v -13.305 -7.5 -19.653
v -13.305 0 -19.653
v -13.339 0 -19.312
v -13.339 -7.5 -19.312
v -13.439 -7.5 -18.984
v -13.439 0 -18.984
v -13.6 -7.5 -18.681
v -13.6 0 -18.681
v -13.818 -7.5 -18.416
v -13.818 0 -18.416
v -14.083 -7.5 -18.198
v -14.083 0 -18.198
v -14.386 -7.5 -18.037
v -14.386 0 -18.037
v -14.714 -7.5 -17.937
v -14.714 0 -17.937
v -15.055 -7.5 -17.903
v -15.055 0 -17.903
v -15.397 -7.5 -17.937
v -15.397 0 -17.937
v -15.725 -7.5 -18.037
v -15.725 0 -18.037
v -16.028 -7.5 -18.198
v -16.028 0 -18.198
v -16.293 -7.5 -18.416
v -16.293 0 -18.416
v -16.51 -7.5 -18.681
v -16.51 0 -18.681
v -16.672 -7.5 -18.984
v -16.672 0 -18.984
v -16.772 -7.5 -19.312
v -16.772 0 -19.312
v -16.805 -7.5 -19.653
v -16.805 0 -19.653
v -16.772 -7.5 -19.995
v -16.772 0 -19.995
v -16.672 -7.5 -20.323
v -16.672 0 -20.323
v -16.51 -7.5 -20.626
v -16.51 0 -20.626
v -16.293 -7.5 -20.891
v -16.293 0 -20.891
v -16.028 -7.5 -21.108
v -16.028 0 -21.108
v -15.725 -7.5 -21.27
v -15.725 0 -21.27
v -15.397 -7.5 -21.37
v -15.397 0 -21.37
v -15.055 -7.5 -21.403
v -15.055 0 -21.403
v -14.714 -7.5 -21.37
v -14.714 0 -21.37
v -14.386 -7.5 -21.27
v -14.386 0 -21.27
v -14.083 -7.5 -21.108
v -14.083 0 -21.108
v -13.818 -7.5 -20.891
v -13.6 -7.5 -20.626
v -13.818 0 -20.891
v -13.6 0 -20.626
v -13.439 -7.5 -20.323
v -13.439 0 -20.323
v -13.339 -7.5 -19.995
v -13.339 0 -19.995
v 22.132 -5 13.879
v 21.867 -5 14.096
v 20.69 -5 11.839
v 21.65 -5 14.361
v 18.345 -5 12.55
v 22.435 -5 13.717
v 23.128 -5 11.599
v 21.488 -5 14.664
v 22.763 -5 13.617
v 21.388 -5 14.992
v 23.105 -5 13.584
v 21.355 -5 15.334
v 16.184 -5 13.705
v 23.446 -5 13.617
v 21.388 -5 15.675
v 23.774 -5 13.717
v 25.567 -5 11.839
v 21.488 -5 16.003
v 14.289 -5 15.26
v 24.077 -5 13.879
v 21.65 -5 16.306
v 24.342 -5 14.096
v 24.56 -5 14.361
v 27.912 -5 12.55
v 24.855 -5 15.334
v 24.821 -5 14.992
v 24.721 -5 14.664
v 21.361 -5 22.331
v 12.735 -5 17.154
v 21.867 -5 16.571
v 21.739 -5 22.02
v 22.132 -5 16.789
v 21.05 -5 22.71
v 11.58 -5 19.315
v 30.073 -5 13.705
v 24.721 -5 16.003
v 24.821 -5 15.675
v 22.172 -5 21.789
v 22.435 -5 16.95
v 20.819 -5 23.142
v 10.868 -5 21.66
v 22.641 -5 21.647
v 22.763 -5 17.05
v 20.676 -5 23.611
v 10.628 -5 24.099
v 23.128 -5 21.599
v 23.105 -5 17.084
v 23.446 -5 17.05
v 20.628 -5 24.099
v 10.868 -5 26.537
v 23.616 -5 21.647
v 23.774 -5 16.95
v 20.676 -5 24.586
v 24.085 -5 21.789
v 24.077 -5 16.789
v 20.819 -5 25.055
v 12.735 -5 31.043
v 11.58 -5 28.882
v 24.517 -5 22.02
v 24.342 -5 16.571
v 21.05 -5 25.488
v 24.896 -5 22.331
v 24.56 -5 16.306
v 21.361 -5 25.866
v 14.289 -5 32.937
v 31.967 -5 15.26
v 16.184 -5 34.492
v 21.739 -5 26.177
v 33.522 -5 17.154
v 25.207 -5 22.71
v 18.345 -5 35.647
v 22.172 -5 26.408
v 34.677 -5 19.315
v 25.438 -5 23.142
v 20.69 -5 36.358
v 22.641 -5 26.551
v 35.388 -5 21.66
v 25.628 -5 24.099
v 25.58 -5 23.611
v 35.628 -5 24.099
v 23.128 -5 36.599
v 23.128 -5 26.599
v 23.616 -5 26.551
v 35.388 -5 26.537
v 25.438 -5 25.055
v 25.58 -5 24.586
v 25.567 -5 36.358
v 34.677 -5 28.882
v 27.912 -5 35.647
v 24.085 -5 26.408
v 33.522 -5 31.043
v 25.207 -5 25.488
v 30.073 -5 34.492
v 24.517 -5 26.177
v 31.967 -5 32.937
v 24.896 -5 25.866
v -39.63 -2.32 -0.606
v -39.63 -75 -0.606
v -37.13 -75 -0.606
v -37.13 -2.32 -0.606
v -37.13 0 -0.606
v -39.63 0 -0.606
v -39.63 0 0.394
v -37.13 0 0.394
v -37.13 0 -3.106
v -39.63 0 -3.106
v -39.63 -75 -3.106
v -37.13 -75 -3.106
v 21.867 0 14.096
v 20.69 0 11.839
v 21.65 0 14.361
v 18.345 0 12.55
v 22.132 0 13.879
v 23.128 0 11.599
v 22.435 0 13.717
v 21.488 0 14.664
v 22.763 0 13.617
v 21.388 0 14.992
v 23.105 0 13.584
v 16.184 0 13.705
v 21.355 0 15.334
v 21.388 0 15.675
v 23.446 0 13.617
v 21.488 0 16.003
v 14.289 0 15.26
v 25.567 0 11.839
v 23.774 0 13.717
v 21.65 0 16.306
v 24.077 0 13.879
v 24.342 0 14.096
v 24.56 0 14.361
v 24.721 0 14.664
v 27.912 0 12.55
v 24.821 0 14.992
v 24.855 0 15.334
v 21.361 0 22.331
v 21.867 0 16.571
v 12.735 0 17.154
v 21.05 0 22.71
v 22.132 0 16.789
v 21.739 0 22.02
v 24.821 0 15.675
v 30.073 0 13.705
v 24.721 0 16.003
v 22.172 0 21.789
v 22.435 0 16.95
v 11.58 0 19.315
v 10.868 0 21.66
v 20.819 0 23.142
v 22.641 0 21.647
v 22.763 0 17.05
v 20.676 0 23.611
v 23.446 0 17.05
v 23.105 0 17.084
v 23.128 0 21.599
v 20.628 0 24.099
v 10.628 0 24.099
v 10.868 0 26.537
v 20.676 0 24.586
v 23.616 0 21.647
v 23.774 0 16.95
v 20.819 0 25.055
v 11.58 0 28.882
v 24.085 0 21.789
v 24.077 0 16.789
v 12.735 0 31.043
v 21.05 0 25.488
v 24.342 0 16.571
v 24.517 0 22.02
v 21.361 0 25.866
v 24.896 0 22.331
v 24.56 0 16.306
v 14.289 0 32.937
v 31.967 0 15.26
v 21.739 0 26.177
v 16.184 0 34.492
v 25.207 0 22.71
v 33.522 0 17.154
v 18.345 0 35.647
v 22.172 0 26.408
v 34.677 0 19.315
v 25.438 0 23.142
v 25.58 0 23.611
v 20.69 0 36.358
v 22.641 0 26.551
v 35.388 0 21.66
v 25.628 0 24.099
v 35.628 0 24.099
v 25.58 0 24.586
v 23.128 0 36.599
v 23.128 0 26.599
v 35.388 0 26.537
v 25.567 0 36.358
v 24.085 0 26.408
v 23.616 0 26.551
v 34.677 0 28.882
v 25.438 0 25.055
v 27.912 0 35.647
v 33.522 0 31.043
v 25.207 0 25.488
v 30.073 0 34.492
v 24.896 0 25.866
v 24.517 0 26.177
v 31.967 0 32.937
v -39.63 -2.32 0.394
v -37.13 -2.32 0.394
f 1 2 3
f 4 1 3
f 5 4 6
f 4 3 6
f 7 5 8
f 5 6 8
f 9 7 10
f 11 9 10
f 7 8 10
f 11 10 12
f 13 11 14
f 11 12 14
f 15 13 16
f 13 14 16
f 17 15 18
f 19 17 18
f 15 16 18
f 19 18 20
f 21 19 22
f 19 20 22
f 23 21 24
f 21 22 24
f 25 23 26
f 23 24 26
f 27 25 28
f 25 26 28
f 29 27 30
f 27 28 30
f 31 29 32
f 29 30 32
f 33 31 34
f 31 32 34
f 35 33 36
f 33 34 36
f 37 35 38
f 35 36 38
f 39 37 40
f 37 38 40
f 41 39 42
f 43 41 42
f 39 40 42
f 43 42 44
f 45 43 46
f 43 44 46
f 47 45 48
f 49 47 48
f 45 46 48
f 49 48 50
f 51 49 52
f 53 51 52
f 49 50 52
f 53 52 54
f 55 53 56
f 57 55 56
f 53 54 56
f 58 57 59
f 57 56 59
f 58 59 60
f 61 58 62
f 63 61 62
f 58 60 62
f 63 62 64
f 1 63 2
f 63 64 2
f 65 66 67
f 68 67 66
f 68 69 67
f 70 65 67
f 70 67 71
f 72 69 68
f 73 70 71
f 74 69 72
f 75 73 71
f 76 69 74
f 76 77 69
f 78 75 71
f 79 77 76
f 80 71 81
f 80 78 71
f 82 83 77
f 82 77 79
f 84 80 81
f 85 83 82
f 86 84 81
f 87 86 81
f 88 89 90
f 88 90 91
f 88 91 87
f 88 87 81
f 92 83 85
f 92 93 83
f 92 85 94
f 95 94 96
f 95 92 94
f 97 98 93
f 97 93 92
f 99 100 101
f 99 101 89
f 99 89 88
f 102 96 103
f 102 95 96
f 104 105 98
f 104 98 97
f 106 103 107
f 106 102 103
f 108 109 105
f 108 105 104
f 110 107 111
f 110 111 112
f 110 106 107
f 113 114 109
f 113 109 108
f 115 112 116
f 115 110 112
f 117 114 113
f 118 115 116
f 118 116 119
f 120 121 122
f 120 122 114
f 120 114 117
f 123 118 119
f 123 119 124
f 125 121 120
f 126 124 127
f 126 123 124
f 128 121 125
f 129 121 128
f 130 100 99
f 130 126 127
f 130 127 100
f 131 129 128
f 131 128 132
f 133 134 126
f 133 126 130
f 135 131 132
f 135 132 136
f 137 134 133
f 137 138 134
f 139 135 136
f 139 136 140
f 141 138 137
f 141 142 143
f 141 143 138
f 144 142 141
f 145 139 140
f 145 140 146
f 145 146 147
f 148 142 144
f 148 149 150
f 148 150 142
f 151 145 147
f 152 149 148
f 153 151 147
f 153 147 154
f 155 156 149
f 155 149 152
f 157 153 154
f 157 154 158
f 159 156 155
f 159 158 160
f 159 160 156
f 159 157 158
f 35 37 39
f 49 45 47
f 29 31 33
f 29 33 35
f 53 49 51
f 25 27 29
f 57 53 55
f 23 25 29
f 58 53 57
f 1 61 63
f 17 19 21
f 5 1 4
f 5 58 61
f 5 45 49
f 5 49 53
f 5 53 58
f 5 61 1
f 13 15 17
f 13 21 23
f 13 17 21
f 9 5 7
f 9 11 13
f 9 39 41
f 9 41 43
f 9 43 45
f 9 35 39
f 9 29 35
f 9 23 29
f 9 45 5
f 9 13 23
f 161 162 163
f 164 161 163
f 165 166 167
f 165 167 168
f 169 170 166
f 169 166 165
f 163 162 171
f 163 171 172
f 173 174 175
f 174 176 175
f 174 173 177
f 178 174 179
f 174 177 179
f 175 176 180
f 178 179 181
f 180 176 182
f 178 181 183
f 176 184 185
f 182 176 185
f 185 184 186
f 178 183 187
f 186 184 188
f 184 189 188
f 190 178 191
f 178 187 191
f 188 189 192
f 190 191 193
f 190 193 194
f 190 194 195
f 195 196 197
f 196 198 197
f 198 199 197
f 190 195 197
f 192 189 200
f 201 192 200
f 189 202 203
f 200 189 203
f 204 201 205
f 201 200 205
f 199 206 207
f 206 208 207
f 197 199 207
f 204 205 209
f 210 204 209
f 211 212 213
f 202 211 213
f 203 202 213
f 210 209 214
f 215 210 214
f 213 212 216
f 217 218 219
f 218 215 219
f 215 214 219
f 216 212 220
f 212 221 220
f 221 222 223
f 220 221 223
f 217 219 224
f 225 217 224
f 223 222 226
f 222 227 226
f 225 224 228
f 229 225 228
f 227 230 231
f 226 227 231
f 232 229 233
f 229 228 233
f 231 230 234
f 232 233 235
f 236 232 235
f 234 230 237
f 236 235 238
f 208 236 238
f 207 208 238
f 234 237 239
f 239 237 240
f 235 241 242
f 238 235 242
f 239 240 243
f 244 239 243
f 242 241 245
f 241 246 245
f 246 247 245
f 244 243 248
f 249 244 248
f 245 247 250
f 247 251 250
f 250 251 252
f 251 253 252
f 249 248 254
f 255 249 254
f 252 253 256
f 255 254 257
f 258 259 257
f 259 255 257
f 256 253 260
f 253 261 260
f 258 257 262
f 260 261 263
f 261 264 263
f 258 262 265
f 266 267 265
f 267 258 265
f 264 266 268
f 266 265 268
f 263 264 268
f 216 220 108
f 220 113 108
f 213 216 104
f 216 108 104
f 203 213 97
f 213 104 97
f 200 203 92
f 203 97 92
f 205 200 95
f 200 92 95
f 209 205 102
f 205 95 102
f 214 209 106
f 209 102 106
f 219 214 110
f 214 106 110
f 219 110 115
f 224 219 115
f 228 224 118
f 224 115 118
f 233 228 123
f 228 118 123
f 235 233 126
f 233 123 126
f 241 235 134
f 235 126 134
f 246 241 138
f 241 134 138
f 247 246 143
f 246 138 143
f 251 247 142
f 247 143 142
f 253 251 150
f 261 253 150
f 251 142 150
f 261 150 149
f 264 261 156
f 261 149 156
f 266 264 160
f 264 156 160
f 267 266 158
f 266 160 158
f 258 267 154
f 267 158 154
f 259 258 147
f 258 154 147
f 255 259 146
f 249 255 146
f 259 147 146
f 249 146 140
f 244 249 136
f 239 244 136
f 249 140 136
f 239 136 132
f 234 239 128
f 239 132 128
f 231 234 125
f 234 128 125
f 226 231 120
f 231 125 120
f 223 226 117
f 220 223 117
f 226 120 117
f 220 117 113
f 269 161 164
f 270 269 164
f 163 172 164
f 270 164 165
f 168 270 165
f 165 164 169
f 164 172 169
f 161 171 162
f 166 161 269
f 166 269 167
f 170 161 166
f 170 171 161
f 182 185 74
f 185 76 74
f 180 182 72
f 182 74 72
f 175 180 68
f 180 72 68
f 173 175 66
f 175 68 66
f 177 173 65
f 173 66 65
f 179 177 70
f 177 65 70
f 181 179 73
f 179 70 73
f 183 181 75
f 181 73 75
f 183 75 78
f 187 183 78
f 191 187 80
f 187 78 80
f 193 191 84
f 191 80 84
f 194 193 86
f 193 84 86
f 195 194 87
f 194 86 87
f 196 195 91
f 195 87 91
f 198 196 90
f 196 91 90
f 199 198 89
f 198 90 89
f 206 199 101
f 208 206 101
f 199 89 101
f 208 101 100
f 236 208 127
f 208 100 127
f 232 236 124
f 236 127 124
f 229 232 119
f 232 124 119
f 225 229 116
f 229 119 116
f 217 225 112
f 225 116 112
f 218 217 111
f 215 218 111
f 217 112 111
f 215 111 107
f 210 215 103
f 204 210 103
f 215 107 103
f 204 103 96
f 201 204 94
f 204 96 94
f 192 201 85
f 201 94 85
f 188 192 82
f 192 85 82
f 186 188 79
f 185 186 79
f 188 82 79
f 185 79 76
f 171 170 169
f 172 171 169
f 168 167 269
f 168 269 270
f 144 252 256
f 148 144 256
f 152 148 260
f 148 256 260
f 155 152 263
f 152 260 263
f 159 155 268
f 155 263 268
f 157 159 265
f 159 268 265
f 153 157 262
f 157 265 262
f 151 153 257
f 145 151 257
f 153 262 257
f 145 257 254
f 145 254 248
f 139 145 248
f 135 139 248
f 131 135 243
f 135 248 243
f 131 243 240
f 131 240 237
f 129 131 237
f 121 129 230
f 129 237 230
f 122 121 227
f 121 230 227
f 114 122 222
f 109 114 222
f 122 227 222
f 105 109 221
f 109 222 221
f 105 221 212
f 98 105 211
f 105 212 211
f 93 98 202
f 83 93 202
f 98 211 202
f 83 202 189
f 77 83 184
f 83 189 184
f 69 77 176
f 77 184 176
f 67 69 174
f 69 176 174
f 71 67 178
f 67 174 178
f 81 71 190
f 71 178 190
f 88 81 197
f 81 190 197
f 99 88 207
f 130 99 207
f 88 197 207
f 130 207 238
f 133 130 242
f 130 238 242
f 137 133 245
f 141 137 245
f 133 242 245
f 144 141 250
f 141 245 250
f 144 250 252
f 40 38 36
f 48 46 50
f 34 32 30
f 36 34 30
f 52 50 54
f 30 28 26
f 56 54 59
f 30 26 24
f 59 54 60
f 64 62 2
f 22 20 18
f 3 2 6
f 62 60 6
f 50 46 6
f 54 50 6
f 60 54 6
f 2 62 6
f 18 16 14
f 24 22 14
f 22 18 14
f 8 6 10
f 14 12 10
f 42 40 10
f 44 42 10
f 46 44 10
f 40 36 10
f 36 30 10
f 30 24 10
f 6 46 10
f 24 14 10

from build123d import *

# Parameters (mm, degrees)
F0_R      = 12.5
F1_DEPTH  = 5
F2_D      = 5
F2_DEPTH  = 5
F2_TIP    = 1.5021515476
F4_D      = 3.5
F4_DEPTH  = 5
F4_TIP    = 1.0515060833
F5_R      = 1.75
F6_DEPTH  = 7.5
F7_W      = 2.5
F7_H      = 2.5
F8_DEPTH  = 75
F9_W      = 2.5
F9_H      = 2.3198798299
F10_DEPTH = 1


with BuildPart() as f1:
    # F0 (on Front) → F1 (new body)
    with BuildSketch(Plane.XZ):
        with Locations((23.1283046305, 24.098623544)):
            Circle(F0_R)
    extrude(amount=F1_DEPTH)

    # F2
    with Locations(Plane(origin=(0, 0, 0), x_dir=(1, 0, 0), z_dir=(0, 1, 0))):
        with Locations((23.1283046305, -24.098623544)):
            Hole(F2_D / 2, depth=F2_DEPTH)
            with Locations((0, 0, -(F2_DEPTH + F2_TIP / 2))):  # 118° drill point
                Cone(0, F2_D / 2, F2_TIP, mode=Mode.SUBTRACT)

    # F4
    with Locations(Plane(origin=(0, 0, 0), x_dir=(1, 0, 0), z_dir=(0, 1, 0))):
        with Locations((23.1047105044, -15.3335866332)):
            Hole(F4_D / 2, depth=F4_DEPTH)
            with Locations((0, 0, -(F4_DEPTH + F4_TIP / 2))):  # 118° drill point
                Cone(0, F4_D / 2, F4_TIP, mode=Mode.SUBTRACT)


with BuildPart() as f6:
    # F5 (on Front) → F6 (new body)
    with BuildSketch(Plane.XZ):
        with Locations((-15.0553602725, -19.6533743292)):
            Circle(F5_R)
    extrude(amount=F6_DEPTH)


with BuildPart() as f8:
    # F7 (on Front) → F8 (new body)
    with BuildSketch(Plane.XZ):
        with Locations((-38.379817009, -1.8555561267)):
            Rectangle(F7_W, F7_H)
    extrude(amount=F8_DEPTH)

    # F9 (on face) → F10 (join)
    with BuildSketch(Plane.XY.offset(-0.6055561267)):
        with Locations((-38.379817009, -1.1599399149)):
            Rectangle(F9_W, F9_H)
    extrude(amount=F10_DEPTH)


solid = Compound([f1.part, f6.part, f8.part])
